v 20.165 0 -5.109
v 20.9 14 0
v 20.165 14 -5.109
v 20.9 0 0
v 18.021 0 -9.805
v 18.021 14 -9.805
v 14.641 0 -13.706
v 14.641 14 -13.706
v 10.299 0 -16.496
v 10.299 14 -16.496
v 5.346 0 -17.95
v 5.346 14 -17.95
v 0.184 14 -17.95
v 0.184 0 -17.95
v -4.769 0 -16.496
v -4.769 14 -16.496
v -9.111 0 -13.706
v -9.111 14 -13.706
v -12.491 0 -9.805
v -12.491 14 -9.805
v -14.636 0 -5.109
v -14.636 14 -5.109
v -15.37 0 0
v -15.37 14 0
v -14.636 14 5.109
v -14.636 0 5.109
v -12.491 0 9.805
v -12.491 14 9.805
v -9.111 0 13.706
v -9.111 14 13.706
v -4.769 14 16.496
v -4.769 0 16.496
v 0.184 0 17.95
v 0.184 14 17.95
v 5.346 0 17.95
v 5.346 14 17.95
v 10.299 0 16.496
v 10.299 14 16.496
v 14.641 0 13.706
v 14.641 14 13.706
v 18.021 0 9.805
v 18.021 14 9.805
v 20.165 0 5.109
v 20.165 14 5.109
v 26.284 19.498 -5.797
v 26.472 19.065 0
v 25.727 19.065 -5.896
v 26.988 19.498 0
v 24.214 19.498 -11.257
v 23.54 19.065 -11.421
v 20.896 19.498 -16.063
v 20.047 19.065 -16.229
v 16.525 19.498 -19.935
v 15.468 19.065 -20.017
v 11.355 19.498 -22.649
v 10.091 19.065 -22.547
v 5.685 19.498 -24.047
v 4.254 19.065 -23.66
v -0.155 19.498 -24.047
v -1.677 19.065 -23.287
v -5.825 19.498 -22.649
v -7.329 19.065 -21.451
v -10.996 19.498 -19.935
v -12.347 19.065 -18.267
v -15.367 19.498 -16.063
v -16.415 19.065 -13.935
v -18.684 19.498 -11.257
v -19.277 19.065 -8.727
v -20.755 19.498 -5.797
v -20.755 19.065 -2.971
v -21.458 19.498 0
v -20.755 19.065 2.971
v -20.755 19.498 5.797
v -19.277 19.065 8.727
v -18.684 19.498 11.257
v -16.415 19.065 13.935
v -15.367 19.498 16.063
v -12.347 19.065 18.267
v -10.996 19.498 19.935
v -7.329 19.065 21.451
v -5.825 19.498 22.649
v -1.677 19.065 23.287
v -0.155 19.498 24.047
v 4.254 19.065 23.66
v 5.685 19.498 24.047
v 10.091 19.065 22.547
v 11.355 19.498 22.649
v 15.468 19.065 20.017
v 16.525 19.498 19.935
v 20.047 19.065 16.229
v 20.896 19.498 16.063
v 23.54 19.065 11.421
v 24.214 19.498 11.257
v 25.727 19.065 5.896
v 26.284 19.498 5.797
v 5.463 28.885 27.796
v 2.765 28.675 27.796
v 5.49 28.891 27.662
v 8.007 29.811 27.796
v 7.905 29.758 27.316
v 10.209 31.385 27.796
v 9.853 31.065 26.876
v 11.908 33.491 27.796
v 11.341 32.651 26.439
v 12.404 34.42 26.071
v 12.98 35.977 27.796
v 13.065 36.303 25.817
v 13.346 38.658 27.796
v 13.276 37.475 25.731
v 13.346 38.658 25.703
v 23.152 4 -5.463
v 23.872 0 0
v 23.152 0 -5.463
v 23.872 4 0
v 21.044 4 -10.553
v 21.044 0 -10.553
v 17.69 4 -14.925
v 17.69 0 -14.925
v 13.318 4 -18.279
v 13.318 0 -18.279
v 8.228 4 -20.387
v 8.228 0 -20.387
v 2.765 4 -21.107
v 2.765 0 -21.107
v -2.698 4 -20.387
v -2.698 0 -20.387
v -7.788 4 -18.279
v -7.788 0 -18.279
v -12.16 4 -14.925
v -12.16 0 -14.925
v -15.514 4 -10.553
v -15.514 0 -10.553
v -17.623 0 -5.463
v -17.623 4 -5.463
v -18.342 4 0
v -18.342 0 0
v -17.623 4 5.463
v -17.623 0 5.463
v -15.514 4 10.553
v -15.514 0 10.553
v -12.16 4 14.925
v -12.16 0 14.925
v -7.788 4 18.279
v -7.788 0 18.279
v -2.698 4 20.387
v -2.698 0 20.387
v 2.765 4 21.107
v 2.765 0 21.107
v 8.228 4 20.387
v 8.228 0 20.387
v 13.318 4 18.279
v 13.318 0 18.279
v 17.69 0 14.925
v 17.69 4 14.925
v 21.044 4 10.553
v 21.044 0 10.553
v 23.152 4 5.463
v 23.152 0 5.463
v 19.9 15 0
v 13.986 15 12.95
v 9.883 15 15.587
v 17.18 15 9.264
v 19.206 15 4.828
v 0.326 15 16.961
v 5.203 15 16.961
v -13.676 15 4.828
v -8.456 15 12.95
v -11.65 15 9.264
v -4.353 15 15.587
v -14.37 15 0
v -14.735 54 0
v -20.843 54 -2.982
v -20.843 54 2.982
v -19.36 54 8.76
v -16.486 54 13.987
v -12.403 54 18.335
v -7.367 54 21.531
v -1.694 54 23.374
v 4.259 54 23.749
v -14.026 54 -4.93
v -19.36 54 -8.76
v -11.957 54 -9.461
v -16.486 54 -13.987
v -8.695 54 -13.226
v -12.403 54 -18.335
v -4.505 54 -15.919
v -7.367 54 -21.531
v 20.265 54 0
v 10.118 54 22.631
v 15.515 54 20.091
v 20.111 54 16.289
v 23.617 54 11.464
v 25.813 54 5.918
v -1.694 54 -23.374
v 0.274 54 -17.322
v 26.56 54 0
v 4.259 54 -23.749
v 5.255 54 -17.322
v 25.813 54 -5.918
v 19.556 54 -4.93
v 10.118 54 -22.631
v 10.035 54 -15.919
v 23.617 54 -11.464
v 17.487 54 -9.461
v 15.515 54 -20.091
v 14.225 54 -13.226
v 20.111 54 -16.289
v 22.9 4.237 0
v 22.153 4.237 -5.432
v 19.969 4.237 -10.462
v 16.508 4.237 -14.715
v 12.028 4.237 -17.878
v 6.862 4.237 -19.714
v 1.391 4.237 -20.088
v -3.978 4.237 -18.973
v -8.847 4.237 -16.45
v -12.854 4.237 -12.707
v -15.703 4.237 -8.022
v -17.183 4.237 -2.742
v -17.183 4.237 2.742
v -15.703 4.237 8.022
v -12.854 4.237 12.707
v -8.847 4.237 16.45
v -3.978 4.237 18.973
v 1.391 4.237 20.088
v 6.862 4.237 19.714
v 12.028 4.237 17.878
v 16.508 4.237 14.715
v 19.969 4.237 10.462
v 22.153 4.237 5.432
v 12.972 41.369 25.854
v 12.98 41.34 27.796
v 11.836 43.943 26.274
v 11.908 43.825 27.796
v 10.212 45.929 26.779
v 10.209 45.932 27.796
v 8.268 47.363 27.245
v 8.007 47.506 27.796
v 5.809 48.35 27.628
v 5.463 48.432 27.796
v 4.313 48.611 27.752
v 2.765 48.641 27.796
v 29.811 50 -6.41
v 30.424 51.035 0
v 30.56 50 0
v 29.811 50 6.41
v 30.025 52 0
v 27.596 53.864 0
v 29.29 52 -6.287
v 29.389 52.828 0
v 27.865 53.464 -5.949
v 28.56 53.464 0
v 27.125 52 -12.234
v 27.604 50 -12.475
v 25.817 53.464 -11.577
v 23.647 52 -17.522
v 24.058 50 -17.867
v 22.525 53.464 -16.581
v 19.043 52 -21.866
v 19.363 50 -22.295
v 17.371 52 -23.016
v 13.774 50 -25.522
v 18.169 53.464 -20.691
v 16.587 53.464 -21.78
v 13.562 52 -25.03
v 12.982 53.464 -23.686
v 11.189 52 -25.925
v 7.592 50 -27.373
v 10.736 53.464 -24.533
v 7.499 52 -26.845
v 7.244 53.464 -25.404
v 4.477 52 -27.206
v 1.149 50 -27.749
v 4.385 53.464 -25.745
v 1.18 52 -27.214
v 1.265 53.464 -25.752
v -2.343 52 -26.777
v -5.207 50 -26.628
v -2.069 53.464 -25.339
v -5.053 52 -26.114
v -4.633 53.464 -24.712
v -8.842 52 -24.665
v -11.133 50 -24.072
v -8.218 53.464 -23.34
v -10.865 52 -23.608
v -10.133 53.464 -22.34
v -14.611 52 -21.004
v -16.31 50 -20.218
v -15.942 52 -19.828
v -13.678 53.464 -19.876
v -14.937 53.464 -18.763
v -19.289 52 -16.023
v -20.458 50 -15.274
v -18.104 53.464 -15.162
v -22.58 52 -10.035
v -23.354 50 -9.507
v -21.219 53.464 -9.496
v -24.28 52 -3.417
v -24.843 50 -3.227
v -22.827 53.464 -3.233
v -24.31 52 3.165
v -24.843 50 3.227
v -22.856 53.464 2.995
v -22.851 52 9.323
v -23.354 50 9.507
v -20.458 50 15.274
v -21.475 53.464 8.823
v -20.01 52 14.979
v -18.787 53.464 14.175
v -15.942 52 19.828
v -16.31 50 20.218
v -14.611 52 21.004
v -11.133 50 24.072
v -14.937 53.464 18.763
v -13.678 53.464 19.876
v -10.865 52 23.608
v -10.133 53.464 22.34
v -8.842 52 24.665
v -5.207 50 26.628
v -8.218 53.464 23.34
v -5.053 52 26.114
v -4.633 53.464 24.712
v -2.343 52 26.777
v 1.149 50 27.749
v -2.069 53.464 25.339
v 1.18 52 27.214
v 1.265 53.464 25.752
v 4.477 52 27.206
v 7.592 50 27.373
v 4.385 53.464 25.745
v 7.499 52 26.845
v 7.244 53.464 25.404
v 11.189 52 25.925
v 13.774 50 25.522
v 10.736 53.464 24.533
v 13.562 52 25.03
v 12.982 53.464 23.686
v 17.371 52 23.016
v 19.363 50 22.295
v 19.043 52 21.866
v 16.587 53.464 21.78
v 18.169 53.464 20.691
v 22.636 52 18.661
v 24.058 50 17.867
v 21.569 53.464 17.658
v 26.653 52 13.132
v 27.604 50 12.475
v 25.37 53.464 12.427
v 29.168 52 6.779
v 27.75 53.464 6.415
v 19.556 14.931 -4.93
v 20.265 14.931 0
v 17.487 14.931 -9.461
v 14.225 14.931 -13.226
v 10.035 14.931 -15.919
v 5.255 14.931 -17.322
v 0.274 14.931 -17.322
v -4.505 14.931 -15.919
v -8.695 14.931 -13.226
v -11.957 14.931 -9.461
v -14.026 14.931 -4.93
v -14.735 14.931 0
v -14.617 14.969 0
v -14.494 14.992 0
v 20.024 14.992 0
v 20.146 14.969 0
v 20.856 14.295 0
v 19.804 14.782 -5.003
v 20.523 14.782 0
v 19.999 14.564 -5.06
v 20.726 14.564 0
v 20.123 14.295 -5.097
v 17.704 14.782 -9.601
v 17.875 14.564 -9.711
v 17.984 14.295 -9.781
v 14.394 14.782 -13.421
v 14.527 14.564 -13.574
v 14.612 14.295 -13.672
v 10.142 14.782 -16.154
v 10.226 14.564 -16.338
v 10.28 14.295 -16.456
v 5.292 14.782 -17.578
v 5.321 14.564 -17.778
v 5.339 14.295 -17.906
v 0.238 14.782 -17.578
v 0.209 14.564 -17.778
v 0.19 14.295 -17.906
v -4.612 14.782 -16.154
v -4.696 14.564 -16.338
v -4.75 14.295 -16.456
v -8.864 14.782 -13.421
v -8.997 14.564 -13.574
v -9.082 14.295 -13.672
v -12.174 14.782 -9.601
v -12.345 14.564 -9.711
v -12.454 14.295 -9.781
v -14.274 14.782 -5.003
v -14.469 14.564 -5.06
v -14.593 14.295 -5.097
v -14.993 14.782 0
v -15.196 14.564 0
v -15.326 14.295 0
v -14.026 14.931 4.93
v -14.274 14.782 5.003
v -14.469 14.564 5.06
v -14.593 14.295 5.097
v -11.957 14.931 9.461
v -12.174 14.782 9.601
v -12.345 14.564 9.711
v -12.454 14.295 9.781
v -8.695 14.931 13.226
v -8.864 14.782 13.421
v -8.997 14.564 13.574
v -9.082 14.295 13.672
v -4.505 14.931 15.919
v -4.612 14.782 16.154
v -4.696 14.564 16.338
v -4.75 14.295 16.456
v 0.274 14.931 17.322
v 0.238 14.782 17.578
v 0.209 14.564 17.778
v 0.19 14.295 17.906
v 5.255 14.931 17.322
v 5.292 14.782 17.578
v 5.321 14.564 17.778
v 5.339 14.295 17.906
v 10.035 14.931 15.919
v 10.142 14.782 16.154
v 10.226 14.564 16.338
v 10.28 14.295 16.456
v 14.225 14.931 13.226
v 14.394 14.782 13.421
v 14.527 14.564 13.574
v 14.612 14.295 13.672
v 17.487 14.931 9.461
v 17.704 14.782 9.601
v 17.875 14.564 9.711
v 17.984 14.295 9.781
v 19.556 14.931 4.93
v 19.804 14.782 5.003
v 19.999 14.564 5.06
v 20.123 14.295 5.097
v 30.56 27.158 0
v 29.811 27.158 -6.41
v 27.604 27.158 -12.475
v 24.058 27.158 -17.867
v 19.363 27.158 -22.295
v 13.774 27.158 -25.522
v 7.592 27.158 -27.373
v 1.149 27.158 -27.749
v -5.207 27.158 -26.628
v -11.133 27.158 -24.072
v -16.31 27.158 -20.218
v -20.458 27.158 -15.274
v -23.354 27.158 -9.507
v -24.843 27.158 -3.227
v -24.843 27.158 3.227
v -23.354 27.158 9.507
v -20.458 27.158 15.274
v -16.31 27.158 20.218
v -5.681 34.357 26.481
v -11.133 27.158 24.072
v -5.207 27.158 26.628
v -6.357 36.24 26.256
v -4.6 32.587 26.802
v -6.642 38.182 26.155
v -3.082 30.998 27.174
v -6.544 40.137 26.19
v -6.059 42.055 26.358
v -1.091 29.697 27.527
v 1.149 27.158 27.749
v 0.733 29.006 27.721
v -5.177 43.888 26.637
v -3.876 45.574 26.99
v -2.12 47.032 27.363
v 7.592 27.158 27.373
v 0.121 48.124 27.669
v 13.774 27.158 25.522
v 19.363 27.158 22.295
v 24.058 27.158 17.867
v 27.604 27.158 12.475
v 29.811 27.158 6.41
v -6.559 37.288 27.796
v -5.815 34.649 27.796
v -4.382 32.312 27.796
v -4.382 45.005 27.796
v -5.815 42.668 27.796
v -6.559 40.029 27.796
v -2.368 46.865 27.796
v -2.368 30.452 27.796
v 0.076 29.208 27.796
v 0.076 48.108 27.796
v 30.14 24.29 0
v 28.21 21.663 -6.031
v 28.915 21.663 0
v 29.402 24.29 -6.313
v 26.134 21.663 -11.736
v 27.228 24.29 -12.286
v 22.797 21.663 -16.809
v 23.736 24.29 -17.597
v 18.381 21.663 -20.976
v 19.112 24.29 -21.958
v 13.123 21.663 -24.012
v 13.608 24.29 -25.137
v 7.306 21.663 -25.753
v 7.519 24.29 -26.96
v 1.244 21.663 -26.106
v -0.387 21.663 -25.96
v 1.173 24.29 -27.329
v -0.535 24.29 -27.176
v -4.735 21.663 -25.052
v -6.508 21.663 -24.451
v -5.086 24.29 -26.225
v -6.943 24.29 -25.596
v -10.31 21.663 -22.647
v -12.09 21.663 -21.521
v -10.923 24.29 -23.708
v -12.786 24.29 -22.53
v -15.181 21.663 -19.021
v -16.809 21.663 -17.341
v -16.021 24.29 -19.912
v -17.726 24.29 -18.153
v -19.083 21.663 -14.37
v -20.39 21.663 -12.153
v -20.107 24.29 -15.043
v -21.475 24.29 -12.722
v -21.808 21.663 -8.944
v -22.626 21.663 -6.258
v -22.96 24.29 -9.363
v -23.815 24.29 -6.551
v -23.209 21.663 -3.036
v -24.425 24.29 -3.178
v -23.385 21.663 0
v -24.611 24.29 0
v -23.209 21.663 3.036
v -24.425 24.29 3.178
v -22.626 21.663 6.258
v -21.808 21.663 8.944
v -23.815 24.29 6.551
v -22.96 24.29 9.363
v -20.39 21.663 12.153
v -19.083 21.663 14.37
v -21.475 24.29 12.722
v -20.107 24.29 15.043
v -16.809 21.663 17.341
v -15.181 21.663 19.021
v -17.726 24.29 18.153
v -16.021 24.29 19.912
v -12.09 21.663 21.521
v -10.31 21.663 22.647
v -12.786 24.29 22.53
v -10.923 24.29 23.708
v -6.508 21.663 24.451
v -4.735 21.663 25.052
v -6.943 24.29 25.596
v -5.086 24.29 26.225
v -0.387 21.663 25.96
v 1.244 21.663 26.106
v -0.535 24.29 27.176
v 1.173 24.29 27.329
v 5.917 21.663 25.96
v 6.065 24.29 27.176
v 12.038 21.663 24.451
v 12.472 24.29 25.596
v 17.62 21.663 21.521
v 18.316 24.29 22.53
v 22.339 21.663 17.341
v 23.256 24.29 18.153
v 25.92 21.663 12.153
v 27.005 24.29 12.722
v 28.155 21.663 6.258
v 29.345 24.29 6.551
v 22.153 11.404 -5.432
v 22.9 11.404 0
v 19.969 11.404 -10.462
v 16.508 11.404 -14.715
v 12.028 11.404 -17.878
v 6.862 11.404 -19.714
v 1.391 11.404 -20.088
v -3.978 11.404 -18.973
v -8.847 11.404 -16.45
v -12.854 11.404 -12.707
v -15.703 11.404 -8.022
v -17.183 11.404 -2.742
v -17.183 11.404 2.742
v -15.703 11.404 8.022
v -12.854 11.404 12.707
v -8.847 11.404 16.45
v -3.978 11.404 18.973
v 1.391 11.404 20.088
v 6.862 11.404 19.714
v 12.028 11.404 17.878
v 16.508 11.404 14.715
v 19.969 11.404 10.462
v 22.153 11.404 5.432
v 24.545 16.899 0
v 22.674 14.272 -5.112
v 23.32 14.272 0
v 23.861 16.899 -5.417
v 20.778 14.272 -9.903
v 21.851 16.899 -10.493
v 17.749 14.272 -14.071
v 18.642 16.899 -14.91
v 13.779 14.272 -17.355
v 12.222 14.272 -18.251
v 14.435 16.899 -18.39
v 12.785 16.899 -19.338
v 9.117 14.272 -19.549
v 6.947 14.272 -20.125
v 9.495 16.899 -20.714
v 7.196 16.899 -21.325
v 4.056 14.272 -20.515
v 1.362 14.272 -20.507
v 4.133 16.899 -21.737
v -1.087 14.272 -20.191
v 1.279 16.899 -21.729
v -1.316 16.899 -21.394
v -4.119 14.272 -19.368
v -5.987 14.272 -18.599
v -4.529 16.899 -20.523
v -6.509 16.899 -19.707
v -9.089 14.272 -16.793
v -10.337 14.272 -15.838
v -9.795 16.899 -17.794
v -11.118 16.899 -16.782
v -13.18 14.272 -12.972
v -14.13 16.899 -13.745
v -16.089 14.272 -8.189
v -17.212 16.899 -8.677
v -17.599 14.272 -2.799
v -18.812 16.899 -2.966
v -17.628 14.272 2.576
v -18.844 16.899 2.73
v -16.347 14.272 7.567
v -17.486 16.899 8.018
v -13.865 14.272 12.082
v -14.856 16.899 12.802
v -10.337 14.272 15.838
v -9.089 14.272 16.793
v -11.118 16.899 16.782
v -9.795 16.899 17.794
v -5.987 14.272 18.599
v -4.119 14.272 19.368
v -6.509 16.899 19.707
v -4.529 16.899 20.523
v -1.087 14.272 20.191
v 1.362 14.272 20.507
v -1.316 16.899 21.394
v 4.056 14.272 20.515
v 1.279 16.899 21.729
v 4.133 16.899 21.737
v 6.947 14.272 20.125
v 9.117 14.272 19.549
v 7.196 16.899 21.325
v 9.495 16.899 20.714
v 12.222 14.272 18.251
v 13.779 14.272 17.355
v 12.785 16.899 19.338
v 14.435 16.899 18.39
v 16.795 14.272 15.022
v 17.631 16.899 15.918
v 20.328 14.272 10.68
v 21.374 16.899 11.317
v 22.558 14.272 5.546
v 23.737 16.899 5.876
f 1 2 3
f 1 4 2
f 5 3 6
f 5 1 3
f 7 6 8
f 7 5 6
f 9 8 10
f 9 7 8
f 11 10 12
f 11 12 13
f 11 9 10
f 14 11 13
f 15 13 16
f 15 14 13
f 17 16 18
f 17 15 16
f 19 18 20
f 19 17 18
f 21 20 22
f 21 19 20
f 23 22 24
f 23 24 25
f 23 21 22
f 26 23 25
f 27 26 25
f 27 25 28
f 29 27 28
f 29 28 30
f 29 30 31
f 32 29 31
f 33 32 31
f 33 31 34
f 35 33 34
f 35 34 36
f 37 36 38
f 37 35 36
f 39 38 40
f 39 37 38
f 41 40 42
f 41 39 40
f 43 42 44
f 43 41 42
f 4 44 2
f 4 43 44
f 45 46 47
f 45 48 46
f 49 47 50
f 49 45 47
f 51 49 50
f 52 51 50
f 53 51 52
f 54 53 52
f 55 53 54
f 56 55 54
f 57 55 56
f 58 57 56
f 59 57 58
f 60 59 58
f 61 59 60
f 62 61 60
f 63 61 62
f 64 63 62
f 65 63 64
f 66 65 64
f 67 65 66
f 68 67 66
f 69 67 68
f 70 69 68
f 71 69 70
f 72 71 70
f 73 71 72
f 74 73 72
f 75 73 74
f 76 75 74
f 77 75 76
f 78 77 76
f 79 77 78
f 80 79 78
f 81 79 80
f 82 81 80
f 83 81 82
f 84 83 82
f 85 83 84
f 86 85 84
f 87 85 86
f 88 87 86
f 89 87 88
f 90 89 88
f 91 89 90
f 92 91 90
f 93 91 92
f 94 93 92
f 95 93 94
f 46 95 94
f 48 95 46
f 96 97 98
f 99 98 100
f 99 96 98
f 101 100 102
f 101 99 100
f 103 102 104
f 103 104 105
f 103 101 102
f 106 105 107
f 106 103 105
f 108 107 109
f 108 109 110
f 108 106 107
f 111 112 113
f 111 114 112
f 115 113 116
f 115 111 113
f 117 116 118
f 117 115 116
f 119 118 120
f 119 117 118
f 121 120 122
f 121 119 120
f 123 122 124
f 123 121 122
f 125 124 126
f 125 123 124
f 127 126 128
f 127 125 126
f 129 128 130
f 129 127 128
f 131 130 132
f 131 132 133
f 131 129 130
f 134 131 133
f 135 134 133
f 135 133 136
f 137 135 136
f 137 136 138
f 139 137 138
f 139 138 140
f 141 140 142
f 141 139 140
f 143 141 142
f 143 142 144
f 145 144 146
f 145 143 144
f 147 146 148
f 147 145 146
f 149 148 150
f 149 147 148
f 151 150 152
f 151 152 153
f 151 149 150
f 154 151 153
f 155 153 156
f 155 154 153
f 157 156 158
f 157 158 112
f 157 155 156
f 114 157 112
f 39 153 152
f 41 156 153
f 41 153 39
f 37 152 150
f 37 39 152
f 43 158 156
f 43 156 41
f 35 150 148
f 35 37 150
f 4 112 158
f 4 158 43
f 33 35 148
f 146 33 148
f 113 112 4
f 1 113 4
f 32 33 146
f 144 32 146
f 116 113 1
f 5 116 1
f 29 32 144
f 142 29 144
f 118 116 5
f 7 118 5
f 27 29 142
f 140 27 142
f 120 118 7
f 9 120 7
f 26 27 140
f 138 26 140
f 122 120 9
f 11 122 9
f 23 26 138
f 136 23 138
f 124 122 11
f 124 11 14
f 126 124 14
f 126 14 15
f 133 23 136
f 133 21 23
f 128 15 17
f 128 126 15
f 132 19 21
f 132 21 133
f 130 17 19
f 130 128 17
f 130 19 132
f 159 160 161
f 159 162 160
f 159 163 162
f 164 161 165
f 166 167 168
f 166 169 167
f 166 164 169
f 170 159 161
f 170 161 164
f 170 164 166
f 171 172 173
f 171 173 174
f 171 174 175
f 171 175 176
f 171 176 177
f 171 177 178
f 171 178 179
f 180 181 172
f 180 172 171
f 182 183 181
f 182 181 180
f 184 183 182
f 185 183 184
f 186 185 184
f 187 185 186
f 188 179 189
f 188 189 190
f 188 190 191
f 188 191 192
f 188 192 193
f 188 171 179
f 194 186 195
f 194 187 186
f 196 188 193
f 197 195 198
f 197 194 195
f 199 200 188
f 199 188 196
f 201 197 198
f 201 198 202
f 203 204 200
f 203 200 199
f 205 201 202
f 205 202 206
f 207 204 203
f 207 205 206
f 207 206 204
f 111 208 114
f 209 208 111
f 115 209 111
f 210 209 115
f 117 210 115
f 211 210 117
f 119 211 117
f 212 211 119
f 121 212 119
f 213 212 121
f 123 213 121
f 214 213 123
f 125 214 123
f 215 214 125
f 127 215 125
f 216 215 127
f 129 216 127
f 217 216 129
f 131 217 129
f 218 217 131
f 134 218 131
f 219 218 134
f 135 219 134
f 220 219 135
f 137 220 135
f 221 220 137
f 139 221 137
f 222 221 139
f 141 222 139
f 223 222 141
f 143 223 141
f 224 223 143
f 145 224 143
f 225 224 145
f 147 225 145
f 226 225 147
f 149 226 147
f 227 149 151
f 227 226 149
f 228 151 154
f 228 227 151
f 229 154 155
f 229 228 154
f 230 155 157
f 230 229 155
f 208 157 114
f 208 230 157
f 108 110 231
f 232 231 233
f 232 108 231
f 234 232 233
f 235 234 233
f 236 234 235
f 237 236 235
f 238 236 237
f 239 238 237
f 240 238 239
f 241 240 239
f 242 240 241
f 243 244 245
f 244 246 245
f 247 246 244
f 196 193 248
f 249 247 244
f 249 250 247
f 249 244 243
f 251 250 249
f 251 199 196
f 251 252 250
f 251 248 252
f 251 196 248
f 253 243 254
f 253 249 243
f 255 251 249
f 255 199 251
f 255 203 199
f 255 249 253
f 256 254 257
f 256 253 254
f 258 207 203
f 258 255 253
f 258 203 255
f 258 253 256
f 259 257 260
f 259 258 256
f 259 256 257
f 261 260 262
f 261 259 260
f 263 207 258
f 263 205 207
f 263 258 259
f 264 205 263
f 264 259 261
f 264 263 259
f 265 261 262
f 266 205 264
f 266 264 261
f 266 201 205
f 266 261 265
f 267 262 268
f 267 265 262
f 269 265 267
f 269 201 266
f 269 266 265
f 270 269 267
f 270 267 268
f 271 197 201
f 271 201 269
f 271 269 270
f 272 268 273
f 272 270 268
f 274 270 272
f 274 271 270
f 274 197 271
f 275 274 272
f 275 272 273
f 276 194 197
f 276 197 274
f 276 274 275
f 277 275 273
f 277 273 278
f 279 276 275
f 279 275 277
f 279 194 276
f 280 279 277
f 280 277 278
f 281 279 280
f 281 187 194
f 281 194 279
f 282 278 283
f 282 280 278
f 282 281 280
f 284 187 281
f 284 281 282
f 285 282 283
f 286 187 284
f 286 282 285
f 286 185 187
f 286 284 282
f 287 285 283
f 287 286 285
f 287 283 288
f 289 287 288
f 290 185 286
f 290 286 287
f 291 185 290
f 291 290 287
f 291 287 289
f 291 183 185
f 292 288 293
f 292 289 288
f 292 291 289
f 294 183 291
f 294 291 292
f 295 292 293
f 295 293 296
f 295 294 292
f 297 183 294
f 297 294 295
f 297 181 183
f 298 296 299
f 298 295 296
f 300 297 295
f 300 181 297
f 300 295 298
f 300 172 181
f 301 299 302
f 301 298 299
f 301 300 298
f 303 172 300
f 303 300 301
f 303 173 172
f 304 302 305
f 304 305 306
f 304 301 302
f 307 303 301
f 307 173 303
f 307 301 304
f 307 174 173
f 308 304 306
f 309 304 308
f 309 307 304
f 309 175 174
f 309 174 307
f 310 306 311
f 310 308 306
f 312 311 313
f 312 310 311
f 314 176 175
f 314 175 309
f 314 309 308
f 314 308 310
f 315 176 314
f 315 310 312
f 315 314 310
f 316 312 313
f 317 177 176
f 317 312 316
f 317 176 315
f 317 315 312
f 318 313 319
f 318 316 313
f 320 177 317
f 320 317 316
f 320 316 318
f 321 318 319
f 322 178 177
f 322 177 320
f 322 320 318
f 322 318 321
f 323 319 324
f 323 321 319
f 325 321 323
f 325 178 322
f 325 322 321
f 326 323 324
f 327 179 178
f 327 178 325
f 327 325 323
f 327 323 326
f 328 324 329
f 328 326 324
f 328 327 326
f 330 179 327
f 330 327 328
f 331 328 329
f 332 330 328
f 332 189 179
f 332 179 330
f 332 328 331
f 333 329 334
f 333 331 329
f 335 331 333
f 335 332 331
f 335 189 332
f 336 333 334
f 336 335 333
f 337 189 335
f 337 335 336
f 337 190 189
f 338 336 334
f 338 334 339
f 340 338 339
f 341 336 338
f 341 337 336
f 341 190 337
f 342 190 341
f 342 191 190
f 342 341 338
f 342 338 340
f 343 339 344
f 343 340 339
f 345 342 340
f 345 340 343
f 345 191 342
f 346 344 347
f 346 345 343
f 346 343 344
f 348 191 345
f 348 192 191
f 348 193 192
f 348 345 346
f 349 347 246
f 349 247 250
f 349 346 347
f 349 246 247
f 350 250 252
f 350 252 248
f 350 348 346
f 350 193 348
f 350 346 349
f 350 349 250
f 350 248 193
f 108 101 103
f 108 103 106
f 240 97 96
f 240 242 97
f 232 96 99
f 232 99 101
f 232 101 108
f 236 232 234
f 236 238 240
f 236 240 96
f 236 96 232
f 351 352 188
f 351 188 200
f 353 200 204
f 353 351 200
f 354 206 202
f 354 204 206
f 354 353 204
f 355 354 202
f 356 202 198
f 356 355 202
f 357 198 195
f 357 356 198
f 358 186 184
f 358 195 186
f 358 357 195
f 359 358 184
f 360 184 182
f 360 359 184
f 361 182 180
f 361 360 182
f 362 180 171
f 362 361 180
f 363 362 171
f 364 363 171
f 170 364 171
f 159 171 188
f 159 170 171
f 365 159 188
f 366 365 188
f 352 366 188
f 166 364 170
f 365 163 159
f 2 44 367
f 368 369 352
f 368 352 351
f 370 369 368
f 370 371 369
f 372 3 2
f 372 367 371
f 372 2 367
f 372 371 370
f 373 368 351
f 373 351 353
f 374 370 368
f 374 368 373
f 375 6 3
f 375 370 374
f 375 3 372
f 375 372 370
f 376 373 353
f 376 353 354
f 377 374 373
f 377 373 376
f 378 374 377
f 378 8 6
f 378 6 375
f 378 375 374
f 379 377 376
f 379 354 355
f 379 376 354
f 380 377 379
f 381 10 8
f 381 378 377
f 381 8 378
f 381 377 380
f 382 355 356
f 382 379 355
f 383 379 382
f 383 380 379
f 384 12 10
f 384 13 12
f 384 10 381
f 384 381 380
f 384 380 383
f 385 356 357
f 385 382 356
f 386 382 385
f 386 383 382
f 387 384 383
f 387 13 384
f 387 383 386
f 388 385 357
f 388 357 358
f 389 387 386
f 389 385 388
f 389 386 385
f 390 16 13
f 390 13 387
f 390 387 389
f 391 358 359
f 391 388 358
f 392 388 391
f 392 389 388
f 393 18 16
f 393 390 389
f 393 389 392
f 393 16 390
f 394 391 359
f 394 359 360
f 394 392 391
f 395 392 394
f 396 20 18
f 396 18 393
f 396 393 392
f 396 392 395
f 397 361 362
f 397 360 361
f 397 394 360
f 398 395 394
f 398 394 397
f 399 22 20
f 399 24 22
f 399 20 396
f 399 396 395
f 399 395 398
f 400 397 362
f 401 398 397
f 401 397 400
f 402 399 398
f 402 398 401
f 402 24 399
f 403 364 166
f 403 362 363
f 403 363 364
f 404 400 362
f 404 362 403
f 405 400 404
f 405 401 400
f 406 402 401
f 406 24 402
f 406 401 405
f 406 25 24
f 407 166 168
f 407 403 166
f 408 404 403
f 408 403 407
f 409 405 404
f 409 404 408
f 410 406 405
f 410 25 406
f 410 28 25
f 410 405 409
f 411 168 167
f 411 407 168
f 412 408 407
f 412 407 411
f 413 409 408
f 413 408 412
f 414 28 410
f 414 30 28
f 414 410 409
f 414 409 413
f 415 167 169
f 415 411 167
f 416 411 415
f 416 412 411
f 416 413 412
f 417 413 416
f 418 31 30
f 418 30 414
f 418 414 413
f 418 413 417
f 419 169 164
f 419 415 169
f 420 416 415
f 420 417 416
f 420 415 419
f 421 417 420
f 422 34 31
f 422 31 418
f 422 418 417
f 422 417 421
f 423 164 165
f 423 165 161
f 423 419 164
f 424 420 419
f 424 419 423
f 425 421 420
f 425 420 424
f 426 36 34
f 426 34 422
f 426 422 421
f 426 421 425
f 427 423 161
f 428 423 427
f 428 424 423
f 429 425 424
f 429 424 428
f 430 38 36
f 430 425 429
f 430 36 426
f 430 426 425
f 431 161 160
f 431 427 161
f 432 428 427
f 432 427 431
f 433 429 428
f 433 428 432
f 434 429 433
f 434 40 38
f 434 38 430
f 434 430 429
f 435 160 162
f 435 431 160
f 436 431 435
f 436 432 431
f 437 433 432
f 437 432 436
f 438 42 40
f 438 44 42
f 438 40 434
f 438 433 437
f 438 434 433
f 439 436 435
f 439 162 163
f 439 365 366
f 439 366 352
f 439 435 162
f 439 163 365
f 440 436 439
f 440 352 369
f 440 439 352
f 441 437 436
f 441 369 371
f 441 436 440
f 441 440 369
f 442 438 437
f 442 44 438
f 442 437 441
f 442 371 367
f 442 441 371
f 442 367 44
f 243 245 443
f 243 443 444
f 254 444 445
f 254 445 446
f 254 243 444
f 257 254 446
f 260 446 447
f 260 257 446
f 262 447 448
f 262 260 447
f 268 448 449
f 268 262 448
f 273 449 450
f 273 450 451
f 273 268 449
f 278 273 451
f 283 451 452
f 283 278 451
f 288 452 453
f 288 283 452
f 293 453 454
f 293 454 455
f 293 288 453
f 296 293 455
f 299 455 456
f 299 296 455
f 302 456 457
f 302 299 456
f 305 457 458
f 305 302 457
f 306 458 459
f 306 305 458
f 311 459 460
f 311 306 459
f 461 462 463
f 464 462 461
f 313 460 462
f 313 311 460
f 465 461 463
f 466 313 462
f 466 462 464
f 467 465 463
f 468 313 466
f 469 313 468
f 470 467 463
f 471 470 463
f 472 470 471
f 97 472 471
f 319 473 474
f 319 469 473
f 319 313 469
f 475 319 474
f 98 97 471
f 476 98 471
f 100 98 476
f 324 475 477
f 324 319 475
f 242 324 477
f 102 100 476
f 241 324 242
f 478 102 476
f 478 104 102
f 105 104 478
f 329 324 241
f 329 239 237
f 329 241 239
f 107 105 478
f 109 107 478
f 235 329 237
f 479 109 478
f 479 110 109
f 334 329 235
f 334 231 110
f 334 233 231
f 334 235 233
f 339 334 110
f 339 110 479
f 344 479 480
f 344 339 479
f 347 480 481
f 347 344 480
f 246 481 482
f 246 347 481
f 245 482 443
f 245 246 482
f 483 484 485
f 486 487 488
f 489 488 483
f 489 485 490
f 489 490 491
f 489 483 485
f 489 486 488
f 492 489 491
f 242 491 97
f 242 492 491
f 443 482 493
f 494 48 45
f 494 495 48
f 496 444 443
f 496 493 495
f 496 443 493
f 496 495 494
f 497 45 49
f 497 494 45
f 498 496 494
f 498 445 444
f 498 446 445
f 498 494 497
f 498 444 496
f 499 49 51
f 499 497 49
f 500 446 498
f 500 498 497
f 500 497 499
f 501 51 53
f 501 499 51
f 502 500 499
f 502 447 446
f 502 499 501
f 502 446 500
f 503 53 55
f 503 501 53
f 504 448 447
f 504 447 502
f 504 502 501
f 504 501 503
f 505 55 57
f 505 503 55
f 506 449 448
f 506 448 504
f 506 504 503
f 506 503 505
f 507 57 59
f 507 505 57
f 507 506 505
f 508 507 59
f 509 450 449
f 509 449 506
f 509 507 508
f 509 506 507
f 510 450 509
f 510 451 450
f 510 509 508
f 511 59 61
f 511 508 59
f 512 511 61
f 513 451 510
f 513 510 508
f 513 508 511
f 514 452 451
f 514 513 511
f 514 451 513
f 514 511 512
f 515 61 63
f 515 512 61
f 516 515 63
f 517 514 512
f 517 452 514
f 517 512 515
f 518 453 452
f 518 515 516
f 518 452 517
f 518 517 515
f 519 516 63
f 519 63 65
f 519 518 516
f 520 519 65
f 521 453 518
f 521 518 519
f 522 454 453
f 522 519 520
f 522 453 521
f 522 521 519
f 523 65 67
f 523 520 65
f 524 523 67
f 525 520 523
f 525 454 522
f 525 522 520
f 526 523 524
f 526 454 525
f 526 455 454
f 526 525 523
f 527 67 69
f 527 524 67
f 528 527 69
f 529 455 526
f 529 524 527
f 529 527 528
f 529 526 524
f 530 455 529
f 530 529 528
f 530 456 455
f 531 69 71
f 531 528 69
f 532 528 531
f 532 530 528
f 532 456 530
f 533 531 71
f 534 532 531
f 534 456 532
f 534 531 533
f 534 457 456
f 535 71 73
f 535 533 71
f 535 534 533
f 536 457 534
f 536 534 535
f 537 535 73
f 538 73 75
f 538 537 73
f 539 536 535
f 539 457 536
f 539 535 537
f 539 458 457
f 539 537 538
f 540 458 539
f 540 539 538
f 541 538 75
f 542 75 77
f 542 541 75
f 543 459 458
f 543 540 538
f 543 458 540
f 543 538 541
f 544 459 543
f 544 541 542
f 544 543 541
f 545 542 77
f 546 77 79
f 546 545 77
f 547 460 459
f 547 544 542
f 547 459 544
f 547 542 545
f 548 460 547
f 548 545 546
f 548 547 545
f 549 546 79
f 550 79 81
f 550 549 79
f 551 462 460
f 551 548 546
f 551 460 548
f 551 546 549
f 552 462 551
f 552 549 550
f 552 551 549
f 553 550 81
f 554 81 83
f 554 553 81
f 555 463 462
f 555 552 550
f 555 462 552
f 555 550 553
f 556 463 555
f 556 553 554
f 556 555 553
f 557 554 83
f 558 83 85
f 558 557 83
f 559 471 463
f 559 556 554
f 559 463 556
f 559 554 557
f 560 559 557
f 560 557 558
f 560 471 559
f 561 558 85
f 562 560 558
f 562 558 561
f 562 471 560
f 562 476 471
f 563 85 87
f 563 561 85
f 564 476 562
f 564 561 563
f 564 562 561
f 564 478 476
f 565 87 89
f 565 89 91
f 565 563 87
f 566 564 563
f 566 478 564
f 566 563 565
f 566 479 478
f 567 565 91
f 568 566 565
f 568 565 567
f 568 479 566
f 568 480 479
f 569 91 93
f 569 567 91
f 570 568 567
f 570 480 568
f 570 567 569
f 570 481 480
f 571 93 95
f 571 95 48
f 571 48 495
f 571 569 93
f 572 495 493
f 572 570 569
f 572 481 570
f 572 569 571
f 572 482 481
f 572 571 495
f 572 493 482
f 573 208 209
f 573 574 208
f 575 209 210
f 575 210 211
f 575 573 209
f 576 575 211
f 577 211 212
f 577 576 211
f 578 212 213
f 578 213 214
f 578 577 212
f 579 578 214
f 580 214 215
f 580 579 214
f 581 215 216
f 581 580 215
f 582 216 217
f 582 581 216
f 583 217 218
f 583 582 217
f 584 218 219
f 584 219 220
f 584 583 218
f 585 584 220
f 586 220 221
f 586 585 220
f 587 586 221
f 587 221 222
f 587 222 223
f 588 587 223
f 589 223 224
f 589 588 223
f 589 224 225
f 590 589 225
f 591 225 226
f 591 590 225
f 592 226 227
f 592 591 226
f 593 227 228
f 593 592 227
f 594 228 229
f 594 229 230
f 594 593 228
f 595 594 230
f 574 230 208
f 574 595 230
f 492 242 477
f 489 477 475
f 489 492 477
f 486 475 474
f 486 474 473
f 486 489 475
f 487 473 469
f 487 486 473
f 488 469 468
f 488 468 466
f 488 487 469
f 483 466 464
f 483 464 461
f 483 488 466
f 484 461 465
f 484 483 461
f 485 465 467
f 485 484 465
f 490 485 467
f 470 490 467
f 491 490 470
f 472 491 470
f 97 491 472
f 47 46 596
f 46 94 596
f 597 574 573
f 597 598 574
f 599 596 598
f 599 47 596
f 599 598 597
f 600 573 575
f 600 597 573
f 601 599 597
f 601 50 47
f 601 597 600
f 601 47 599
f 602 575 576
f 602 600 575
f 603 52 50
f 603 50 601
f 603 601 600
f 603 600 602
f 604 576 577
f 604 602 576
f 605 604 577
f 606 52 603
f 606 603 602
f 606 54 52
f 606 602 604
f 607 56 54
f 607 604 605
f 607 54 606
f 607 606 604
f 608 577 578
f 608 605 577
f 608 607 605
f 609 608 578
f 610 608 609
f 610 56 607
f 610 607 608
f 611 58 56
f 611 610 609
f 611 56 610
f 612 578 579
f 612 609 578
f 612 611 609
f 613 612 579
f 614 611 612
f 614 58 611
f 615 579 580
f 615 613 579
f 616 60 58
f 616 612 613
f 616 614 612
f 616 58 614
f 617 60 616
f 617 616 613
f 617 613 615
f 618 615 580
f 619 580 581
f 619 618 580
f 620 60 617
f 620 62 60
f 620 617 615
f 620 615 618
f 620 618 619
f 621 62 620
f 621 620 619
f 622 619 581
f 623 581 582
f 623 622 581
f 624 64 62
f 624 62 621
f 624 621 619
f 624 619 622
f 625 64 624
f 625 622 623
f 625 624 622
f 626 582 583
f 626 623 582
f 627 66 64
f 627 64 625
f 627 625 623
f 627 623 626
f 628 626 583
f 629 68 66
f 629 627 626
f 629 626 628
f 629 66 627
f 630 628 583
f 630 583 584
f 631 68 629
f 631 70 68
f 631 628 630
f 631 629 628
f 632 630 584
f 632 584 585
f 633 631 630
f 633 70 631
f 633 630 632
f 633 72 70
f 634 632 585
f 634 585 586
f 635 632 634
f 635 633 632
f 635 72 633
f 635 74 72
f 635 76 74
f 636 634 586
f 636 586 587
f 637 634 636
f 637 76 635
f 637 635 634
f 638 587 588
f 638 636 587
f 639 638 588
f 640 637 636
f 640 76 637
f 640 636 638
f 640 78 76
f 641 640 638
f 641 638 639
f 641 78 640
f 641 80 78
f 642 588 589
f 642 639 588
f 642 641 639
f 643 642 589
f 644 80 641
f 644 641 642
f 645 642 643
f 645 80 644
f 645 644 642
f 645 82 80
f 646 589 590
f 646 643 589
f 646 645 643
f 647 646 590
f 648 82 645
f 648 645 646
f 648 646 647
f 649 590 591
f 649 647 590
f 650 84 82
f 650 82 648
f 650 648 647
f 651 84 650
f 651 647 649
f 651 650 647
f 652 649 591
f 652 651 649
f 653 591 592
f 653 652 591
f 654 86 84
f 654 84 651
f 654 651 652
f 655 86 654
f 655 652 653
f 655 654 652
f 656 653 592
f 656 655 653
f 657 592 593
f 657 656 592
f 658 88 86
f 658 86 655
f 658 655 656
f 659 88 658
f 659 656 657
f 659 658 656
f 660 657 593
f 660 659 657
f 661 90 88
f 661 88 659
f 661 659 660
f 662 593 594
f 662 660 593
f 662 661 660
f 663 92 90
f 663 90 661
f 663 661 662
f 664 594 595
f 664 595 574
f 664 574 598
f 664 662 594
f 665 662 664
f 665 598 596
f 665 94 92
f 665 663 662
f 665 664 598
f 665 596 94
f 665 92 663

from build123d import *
from build123d.topology import SkipClean

# Parameters (mm, degrees)
SKETCH10_R              = 10
BOSS_EXTRUDE1_DEPTH     = 5
CUT_EXTRUDE3_DEPTH      = 45
CUT_EXTRUDE3_DEPTH_BACK = 20


with BuildPart() as part:
    # Sketch1 → Revolve1 (revolve)
    with BuildSketch(Plane.XY):
        with BuildLine():
            Line((20.9, 0), (23.871591838, 0))
            Line((23.871591838, 0), (23.871591838, 4))
            Line((23.871591838, 4), (22.9, 4.236662843))
            Line((22.9, 4.236662843), (22.9, 11.404308102))
            ThreePointArc((22.9, 11.404308102), (23.83692213, 15.63049072), (26.472123903, 19.064752533))
            Line((26.472123903, 19.064752533), (26.988320528, 19.497892931))
            ThreePointArc((26.988320528, 19.497892931), (29.623522302, 22.932154745), (30.560444431, 27.158337362))
            Line((30.560444431, 27.158337362), (30.560444431, 50))
            ThreePointArc((30.560444431, 50), (29.388871556, 52.828427125), (26.560444431, 54))
            Line((26.560444431, 54), (2.764914955, 54))
            Line((2.764914955, 54), (2.764914955, 15))
            Line((2.764914955, 15), (19.9, 15))
            ThreePointArc((19.9, 15), (20.607106781, 14.707106781), (20.9, 14))
            Line((20.9, 14), (20.9, 0))
        make_face()
    revolve(axis=Axis((2.764914955, 7.821821657, 0), (0, 1, 0)))

    # Sketch10 → Boss-Extrude1 (add)
    with SkipClean():  # the faces are left unmerged after this step: merging them gives an invalid solid
        with BuildSketch(Plane.XY.offset(27.795529476)):
            with Locations((3.346345887, 38.658337362)):
                Circle(SKETCH10_R)
        extrude(amount=-BOSS_EXTRUDE1_DEPTH)

    # Sketch11 → Cut-Extrude3 (cut, two sides: drawn at the far end of the back side and taken through both)
    with SkipClean():  # the faces are left unmerged after this step: merging them gives an invalid solid
        with BuildSketch(Plane(origin=(0, 17, 0), x_dir=(1, 0, 0), z_dir=(0, 1, 0)).offset(-CUT_EXTRUDE3_DEPTH_BACK)):
            with BuildLine():
                Line((-14.735085045, 0), (20.264914955, 0))
                ThreePointArc((20.264914955, 0), (2.764914955, 17.5), (-14.735085045, 0))
            make_face()
        extrude(amount=CUT_EXTRUDE3_DEPTH + CUT_EXTRUDE3_DEPTH_BACK, mode=Mode.SUBTRACT)


solid = part.part
